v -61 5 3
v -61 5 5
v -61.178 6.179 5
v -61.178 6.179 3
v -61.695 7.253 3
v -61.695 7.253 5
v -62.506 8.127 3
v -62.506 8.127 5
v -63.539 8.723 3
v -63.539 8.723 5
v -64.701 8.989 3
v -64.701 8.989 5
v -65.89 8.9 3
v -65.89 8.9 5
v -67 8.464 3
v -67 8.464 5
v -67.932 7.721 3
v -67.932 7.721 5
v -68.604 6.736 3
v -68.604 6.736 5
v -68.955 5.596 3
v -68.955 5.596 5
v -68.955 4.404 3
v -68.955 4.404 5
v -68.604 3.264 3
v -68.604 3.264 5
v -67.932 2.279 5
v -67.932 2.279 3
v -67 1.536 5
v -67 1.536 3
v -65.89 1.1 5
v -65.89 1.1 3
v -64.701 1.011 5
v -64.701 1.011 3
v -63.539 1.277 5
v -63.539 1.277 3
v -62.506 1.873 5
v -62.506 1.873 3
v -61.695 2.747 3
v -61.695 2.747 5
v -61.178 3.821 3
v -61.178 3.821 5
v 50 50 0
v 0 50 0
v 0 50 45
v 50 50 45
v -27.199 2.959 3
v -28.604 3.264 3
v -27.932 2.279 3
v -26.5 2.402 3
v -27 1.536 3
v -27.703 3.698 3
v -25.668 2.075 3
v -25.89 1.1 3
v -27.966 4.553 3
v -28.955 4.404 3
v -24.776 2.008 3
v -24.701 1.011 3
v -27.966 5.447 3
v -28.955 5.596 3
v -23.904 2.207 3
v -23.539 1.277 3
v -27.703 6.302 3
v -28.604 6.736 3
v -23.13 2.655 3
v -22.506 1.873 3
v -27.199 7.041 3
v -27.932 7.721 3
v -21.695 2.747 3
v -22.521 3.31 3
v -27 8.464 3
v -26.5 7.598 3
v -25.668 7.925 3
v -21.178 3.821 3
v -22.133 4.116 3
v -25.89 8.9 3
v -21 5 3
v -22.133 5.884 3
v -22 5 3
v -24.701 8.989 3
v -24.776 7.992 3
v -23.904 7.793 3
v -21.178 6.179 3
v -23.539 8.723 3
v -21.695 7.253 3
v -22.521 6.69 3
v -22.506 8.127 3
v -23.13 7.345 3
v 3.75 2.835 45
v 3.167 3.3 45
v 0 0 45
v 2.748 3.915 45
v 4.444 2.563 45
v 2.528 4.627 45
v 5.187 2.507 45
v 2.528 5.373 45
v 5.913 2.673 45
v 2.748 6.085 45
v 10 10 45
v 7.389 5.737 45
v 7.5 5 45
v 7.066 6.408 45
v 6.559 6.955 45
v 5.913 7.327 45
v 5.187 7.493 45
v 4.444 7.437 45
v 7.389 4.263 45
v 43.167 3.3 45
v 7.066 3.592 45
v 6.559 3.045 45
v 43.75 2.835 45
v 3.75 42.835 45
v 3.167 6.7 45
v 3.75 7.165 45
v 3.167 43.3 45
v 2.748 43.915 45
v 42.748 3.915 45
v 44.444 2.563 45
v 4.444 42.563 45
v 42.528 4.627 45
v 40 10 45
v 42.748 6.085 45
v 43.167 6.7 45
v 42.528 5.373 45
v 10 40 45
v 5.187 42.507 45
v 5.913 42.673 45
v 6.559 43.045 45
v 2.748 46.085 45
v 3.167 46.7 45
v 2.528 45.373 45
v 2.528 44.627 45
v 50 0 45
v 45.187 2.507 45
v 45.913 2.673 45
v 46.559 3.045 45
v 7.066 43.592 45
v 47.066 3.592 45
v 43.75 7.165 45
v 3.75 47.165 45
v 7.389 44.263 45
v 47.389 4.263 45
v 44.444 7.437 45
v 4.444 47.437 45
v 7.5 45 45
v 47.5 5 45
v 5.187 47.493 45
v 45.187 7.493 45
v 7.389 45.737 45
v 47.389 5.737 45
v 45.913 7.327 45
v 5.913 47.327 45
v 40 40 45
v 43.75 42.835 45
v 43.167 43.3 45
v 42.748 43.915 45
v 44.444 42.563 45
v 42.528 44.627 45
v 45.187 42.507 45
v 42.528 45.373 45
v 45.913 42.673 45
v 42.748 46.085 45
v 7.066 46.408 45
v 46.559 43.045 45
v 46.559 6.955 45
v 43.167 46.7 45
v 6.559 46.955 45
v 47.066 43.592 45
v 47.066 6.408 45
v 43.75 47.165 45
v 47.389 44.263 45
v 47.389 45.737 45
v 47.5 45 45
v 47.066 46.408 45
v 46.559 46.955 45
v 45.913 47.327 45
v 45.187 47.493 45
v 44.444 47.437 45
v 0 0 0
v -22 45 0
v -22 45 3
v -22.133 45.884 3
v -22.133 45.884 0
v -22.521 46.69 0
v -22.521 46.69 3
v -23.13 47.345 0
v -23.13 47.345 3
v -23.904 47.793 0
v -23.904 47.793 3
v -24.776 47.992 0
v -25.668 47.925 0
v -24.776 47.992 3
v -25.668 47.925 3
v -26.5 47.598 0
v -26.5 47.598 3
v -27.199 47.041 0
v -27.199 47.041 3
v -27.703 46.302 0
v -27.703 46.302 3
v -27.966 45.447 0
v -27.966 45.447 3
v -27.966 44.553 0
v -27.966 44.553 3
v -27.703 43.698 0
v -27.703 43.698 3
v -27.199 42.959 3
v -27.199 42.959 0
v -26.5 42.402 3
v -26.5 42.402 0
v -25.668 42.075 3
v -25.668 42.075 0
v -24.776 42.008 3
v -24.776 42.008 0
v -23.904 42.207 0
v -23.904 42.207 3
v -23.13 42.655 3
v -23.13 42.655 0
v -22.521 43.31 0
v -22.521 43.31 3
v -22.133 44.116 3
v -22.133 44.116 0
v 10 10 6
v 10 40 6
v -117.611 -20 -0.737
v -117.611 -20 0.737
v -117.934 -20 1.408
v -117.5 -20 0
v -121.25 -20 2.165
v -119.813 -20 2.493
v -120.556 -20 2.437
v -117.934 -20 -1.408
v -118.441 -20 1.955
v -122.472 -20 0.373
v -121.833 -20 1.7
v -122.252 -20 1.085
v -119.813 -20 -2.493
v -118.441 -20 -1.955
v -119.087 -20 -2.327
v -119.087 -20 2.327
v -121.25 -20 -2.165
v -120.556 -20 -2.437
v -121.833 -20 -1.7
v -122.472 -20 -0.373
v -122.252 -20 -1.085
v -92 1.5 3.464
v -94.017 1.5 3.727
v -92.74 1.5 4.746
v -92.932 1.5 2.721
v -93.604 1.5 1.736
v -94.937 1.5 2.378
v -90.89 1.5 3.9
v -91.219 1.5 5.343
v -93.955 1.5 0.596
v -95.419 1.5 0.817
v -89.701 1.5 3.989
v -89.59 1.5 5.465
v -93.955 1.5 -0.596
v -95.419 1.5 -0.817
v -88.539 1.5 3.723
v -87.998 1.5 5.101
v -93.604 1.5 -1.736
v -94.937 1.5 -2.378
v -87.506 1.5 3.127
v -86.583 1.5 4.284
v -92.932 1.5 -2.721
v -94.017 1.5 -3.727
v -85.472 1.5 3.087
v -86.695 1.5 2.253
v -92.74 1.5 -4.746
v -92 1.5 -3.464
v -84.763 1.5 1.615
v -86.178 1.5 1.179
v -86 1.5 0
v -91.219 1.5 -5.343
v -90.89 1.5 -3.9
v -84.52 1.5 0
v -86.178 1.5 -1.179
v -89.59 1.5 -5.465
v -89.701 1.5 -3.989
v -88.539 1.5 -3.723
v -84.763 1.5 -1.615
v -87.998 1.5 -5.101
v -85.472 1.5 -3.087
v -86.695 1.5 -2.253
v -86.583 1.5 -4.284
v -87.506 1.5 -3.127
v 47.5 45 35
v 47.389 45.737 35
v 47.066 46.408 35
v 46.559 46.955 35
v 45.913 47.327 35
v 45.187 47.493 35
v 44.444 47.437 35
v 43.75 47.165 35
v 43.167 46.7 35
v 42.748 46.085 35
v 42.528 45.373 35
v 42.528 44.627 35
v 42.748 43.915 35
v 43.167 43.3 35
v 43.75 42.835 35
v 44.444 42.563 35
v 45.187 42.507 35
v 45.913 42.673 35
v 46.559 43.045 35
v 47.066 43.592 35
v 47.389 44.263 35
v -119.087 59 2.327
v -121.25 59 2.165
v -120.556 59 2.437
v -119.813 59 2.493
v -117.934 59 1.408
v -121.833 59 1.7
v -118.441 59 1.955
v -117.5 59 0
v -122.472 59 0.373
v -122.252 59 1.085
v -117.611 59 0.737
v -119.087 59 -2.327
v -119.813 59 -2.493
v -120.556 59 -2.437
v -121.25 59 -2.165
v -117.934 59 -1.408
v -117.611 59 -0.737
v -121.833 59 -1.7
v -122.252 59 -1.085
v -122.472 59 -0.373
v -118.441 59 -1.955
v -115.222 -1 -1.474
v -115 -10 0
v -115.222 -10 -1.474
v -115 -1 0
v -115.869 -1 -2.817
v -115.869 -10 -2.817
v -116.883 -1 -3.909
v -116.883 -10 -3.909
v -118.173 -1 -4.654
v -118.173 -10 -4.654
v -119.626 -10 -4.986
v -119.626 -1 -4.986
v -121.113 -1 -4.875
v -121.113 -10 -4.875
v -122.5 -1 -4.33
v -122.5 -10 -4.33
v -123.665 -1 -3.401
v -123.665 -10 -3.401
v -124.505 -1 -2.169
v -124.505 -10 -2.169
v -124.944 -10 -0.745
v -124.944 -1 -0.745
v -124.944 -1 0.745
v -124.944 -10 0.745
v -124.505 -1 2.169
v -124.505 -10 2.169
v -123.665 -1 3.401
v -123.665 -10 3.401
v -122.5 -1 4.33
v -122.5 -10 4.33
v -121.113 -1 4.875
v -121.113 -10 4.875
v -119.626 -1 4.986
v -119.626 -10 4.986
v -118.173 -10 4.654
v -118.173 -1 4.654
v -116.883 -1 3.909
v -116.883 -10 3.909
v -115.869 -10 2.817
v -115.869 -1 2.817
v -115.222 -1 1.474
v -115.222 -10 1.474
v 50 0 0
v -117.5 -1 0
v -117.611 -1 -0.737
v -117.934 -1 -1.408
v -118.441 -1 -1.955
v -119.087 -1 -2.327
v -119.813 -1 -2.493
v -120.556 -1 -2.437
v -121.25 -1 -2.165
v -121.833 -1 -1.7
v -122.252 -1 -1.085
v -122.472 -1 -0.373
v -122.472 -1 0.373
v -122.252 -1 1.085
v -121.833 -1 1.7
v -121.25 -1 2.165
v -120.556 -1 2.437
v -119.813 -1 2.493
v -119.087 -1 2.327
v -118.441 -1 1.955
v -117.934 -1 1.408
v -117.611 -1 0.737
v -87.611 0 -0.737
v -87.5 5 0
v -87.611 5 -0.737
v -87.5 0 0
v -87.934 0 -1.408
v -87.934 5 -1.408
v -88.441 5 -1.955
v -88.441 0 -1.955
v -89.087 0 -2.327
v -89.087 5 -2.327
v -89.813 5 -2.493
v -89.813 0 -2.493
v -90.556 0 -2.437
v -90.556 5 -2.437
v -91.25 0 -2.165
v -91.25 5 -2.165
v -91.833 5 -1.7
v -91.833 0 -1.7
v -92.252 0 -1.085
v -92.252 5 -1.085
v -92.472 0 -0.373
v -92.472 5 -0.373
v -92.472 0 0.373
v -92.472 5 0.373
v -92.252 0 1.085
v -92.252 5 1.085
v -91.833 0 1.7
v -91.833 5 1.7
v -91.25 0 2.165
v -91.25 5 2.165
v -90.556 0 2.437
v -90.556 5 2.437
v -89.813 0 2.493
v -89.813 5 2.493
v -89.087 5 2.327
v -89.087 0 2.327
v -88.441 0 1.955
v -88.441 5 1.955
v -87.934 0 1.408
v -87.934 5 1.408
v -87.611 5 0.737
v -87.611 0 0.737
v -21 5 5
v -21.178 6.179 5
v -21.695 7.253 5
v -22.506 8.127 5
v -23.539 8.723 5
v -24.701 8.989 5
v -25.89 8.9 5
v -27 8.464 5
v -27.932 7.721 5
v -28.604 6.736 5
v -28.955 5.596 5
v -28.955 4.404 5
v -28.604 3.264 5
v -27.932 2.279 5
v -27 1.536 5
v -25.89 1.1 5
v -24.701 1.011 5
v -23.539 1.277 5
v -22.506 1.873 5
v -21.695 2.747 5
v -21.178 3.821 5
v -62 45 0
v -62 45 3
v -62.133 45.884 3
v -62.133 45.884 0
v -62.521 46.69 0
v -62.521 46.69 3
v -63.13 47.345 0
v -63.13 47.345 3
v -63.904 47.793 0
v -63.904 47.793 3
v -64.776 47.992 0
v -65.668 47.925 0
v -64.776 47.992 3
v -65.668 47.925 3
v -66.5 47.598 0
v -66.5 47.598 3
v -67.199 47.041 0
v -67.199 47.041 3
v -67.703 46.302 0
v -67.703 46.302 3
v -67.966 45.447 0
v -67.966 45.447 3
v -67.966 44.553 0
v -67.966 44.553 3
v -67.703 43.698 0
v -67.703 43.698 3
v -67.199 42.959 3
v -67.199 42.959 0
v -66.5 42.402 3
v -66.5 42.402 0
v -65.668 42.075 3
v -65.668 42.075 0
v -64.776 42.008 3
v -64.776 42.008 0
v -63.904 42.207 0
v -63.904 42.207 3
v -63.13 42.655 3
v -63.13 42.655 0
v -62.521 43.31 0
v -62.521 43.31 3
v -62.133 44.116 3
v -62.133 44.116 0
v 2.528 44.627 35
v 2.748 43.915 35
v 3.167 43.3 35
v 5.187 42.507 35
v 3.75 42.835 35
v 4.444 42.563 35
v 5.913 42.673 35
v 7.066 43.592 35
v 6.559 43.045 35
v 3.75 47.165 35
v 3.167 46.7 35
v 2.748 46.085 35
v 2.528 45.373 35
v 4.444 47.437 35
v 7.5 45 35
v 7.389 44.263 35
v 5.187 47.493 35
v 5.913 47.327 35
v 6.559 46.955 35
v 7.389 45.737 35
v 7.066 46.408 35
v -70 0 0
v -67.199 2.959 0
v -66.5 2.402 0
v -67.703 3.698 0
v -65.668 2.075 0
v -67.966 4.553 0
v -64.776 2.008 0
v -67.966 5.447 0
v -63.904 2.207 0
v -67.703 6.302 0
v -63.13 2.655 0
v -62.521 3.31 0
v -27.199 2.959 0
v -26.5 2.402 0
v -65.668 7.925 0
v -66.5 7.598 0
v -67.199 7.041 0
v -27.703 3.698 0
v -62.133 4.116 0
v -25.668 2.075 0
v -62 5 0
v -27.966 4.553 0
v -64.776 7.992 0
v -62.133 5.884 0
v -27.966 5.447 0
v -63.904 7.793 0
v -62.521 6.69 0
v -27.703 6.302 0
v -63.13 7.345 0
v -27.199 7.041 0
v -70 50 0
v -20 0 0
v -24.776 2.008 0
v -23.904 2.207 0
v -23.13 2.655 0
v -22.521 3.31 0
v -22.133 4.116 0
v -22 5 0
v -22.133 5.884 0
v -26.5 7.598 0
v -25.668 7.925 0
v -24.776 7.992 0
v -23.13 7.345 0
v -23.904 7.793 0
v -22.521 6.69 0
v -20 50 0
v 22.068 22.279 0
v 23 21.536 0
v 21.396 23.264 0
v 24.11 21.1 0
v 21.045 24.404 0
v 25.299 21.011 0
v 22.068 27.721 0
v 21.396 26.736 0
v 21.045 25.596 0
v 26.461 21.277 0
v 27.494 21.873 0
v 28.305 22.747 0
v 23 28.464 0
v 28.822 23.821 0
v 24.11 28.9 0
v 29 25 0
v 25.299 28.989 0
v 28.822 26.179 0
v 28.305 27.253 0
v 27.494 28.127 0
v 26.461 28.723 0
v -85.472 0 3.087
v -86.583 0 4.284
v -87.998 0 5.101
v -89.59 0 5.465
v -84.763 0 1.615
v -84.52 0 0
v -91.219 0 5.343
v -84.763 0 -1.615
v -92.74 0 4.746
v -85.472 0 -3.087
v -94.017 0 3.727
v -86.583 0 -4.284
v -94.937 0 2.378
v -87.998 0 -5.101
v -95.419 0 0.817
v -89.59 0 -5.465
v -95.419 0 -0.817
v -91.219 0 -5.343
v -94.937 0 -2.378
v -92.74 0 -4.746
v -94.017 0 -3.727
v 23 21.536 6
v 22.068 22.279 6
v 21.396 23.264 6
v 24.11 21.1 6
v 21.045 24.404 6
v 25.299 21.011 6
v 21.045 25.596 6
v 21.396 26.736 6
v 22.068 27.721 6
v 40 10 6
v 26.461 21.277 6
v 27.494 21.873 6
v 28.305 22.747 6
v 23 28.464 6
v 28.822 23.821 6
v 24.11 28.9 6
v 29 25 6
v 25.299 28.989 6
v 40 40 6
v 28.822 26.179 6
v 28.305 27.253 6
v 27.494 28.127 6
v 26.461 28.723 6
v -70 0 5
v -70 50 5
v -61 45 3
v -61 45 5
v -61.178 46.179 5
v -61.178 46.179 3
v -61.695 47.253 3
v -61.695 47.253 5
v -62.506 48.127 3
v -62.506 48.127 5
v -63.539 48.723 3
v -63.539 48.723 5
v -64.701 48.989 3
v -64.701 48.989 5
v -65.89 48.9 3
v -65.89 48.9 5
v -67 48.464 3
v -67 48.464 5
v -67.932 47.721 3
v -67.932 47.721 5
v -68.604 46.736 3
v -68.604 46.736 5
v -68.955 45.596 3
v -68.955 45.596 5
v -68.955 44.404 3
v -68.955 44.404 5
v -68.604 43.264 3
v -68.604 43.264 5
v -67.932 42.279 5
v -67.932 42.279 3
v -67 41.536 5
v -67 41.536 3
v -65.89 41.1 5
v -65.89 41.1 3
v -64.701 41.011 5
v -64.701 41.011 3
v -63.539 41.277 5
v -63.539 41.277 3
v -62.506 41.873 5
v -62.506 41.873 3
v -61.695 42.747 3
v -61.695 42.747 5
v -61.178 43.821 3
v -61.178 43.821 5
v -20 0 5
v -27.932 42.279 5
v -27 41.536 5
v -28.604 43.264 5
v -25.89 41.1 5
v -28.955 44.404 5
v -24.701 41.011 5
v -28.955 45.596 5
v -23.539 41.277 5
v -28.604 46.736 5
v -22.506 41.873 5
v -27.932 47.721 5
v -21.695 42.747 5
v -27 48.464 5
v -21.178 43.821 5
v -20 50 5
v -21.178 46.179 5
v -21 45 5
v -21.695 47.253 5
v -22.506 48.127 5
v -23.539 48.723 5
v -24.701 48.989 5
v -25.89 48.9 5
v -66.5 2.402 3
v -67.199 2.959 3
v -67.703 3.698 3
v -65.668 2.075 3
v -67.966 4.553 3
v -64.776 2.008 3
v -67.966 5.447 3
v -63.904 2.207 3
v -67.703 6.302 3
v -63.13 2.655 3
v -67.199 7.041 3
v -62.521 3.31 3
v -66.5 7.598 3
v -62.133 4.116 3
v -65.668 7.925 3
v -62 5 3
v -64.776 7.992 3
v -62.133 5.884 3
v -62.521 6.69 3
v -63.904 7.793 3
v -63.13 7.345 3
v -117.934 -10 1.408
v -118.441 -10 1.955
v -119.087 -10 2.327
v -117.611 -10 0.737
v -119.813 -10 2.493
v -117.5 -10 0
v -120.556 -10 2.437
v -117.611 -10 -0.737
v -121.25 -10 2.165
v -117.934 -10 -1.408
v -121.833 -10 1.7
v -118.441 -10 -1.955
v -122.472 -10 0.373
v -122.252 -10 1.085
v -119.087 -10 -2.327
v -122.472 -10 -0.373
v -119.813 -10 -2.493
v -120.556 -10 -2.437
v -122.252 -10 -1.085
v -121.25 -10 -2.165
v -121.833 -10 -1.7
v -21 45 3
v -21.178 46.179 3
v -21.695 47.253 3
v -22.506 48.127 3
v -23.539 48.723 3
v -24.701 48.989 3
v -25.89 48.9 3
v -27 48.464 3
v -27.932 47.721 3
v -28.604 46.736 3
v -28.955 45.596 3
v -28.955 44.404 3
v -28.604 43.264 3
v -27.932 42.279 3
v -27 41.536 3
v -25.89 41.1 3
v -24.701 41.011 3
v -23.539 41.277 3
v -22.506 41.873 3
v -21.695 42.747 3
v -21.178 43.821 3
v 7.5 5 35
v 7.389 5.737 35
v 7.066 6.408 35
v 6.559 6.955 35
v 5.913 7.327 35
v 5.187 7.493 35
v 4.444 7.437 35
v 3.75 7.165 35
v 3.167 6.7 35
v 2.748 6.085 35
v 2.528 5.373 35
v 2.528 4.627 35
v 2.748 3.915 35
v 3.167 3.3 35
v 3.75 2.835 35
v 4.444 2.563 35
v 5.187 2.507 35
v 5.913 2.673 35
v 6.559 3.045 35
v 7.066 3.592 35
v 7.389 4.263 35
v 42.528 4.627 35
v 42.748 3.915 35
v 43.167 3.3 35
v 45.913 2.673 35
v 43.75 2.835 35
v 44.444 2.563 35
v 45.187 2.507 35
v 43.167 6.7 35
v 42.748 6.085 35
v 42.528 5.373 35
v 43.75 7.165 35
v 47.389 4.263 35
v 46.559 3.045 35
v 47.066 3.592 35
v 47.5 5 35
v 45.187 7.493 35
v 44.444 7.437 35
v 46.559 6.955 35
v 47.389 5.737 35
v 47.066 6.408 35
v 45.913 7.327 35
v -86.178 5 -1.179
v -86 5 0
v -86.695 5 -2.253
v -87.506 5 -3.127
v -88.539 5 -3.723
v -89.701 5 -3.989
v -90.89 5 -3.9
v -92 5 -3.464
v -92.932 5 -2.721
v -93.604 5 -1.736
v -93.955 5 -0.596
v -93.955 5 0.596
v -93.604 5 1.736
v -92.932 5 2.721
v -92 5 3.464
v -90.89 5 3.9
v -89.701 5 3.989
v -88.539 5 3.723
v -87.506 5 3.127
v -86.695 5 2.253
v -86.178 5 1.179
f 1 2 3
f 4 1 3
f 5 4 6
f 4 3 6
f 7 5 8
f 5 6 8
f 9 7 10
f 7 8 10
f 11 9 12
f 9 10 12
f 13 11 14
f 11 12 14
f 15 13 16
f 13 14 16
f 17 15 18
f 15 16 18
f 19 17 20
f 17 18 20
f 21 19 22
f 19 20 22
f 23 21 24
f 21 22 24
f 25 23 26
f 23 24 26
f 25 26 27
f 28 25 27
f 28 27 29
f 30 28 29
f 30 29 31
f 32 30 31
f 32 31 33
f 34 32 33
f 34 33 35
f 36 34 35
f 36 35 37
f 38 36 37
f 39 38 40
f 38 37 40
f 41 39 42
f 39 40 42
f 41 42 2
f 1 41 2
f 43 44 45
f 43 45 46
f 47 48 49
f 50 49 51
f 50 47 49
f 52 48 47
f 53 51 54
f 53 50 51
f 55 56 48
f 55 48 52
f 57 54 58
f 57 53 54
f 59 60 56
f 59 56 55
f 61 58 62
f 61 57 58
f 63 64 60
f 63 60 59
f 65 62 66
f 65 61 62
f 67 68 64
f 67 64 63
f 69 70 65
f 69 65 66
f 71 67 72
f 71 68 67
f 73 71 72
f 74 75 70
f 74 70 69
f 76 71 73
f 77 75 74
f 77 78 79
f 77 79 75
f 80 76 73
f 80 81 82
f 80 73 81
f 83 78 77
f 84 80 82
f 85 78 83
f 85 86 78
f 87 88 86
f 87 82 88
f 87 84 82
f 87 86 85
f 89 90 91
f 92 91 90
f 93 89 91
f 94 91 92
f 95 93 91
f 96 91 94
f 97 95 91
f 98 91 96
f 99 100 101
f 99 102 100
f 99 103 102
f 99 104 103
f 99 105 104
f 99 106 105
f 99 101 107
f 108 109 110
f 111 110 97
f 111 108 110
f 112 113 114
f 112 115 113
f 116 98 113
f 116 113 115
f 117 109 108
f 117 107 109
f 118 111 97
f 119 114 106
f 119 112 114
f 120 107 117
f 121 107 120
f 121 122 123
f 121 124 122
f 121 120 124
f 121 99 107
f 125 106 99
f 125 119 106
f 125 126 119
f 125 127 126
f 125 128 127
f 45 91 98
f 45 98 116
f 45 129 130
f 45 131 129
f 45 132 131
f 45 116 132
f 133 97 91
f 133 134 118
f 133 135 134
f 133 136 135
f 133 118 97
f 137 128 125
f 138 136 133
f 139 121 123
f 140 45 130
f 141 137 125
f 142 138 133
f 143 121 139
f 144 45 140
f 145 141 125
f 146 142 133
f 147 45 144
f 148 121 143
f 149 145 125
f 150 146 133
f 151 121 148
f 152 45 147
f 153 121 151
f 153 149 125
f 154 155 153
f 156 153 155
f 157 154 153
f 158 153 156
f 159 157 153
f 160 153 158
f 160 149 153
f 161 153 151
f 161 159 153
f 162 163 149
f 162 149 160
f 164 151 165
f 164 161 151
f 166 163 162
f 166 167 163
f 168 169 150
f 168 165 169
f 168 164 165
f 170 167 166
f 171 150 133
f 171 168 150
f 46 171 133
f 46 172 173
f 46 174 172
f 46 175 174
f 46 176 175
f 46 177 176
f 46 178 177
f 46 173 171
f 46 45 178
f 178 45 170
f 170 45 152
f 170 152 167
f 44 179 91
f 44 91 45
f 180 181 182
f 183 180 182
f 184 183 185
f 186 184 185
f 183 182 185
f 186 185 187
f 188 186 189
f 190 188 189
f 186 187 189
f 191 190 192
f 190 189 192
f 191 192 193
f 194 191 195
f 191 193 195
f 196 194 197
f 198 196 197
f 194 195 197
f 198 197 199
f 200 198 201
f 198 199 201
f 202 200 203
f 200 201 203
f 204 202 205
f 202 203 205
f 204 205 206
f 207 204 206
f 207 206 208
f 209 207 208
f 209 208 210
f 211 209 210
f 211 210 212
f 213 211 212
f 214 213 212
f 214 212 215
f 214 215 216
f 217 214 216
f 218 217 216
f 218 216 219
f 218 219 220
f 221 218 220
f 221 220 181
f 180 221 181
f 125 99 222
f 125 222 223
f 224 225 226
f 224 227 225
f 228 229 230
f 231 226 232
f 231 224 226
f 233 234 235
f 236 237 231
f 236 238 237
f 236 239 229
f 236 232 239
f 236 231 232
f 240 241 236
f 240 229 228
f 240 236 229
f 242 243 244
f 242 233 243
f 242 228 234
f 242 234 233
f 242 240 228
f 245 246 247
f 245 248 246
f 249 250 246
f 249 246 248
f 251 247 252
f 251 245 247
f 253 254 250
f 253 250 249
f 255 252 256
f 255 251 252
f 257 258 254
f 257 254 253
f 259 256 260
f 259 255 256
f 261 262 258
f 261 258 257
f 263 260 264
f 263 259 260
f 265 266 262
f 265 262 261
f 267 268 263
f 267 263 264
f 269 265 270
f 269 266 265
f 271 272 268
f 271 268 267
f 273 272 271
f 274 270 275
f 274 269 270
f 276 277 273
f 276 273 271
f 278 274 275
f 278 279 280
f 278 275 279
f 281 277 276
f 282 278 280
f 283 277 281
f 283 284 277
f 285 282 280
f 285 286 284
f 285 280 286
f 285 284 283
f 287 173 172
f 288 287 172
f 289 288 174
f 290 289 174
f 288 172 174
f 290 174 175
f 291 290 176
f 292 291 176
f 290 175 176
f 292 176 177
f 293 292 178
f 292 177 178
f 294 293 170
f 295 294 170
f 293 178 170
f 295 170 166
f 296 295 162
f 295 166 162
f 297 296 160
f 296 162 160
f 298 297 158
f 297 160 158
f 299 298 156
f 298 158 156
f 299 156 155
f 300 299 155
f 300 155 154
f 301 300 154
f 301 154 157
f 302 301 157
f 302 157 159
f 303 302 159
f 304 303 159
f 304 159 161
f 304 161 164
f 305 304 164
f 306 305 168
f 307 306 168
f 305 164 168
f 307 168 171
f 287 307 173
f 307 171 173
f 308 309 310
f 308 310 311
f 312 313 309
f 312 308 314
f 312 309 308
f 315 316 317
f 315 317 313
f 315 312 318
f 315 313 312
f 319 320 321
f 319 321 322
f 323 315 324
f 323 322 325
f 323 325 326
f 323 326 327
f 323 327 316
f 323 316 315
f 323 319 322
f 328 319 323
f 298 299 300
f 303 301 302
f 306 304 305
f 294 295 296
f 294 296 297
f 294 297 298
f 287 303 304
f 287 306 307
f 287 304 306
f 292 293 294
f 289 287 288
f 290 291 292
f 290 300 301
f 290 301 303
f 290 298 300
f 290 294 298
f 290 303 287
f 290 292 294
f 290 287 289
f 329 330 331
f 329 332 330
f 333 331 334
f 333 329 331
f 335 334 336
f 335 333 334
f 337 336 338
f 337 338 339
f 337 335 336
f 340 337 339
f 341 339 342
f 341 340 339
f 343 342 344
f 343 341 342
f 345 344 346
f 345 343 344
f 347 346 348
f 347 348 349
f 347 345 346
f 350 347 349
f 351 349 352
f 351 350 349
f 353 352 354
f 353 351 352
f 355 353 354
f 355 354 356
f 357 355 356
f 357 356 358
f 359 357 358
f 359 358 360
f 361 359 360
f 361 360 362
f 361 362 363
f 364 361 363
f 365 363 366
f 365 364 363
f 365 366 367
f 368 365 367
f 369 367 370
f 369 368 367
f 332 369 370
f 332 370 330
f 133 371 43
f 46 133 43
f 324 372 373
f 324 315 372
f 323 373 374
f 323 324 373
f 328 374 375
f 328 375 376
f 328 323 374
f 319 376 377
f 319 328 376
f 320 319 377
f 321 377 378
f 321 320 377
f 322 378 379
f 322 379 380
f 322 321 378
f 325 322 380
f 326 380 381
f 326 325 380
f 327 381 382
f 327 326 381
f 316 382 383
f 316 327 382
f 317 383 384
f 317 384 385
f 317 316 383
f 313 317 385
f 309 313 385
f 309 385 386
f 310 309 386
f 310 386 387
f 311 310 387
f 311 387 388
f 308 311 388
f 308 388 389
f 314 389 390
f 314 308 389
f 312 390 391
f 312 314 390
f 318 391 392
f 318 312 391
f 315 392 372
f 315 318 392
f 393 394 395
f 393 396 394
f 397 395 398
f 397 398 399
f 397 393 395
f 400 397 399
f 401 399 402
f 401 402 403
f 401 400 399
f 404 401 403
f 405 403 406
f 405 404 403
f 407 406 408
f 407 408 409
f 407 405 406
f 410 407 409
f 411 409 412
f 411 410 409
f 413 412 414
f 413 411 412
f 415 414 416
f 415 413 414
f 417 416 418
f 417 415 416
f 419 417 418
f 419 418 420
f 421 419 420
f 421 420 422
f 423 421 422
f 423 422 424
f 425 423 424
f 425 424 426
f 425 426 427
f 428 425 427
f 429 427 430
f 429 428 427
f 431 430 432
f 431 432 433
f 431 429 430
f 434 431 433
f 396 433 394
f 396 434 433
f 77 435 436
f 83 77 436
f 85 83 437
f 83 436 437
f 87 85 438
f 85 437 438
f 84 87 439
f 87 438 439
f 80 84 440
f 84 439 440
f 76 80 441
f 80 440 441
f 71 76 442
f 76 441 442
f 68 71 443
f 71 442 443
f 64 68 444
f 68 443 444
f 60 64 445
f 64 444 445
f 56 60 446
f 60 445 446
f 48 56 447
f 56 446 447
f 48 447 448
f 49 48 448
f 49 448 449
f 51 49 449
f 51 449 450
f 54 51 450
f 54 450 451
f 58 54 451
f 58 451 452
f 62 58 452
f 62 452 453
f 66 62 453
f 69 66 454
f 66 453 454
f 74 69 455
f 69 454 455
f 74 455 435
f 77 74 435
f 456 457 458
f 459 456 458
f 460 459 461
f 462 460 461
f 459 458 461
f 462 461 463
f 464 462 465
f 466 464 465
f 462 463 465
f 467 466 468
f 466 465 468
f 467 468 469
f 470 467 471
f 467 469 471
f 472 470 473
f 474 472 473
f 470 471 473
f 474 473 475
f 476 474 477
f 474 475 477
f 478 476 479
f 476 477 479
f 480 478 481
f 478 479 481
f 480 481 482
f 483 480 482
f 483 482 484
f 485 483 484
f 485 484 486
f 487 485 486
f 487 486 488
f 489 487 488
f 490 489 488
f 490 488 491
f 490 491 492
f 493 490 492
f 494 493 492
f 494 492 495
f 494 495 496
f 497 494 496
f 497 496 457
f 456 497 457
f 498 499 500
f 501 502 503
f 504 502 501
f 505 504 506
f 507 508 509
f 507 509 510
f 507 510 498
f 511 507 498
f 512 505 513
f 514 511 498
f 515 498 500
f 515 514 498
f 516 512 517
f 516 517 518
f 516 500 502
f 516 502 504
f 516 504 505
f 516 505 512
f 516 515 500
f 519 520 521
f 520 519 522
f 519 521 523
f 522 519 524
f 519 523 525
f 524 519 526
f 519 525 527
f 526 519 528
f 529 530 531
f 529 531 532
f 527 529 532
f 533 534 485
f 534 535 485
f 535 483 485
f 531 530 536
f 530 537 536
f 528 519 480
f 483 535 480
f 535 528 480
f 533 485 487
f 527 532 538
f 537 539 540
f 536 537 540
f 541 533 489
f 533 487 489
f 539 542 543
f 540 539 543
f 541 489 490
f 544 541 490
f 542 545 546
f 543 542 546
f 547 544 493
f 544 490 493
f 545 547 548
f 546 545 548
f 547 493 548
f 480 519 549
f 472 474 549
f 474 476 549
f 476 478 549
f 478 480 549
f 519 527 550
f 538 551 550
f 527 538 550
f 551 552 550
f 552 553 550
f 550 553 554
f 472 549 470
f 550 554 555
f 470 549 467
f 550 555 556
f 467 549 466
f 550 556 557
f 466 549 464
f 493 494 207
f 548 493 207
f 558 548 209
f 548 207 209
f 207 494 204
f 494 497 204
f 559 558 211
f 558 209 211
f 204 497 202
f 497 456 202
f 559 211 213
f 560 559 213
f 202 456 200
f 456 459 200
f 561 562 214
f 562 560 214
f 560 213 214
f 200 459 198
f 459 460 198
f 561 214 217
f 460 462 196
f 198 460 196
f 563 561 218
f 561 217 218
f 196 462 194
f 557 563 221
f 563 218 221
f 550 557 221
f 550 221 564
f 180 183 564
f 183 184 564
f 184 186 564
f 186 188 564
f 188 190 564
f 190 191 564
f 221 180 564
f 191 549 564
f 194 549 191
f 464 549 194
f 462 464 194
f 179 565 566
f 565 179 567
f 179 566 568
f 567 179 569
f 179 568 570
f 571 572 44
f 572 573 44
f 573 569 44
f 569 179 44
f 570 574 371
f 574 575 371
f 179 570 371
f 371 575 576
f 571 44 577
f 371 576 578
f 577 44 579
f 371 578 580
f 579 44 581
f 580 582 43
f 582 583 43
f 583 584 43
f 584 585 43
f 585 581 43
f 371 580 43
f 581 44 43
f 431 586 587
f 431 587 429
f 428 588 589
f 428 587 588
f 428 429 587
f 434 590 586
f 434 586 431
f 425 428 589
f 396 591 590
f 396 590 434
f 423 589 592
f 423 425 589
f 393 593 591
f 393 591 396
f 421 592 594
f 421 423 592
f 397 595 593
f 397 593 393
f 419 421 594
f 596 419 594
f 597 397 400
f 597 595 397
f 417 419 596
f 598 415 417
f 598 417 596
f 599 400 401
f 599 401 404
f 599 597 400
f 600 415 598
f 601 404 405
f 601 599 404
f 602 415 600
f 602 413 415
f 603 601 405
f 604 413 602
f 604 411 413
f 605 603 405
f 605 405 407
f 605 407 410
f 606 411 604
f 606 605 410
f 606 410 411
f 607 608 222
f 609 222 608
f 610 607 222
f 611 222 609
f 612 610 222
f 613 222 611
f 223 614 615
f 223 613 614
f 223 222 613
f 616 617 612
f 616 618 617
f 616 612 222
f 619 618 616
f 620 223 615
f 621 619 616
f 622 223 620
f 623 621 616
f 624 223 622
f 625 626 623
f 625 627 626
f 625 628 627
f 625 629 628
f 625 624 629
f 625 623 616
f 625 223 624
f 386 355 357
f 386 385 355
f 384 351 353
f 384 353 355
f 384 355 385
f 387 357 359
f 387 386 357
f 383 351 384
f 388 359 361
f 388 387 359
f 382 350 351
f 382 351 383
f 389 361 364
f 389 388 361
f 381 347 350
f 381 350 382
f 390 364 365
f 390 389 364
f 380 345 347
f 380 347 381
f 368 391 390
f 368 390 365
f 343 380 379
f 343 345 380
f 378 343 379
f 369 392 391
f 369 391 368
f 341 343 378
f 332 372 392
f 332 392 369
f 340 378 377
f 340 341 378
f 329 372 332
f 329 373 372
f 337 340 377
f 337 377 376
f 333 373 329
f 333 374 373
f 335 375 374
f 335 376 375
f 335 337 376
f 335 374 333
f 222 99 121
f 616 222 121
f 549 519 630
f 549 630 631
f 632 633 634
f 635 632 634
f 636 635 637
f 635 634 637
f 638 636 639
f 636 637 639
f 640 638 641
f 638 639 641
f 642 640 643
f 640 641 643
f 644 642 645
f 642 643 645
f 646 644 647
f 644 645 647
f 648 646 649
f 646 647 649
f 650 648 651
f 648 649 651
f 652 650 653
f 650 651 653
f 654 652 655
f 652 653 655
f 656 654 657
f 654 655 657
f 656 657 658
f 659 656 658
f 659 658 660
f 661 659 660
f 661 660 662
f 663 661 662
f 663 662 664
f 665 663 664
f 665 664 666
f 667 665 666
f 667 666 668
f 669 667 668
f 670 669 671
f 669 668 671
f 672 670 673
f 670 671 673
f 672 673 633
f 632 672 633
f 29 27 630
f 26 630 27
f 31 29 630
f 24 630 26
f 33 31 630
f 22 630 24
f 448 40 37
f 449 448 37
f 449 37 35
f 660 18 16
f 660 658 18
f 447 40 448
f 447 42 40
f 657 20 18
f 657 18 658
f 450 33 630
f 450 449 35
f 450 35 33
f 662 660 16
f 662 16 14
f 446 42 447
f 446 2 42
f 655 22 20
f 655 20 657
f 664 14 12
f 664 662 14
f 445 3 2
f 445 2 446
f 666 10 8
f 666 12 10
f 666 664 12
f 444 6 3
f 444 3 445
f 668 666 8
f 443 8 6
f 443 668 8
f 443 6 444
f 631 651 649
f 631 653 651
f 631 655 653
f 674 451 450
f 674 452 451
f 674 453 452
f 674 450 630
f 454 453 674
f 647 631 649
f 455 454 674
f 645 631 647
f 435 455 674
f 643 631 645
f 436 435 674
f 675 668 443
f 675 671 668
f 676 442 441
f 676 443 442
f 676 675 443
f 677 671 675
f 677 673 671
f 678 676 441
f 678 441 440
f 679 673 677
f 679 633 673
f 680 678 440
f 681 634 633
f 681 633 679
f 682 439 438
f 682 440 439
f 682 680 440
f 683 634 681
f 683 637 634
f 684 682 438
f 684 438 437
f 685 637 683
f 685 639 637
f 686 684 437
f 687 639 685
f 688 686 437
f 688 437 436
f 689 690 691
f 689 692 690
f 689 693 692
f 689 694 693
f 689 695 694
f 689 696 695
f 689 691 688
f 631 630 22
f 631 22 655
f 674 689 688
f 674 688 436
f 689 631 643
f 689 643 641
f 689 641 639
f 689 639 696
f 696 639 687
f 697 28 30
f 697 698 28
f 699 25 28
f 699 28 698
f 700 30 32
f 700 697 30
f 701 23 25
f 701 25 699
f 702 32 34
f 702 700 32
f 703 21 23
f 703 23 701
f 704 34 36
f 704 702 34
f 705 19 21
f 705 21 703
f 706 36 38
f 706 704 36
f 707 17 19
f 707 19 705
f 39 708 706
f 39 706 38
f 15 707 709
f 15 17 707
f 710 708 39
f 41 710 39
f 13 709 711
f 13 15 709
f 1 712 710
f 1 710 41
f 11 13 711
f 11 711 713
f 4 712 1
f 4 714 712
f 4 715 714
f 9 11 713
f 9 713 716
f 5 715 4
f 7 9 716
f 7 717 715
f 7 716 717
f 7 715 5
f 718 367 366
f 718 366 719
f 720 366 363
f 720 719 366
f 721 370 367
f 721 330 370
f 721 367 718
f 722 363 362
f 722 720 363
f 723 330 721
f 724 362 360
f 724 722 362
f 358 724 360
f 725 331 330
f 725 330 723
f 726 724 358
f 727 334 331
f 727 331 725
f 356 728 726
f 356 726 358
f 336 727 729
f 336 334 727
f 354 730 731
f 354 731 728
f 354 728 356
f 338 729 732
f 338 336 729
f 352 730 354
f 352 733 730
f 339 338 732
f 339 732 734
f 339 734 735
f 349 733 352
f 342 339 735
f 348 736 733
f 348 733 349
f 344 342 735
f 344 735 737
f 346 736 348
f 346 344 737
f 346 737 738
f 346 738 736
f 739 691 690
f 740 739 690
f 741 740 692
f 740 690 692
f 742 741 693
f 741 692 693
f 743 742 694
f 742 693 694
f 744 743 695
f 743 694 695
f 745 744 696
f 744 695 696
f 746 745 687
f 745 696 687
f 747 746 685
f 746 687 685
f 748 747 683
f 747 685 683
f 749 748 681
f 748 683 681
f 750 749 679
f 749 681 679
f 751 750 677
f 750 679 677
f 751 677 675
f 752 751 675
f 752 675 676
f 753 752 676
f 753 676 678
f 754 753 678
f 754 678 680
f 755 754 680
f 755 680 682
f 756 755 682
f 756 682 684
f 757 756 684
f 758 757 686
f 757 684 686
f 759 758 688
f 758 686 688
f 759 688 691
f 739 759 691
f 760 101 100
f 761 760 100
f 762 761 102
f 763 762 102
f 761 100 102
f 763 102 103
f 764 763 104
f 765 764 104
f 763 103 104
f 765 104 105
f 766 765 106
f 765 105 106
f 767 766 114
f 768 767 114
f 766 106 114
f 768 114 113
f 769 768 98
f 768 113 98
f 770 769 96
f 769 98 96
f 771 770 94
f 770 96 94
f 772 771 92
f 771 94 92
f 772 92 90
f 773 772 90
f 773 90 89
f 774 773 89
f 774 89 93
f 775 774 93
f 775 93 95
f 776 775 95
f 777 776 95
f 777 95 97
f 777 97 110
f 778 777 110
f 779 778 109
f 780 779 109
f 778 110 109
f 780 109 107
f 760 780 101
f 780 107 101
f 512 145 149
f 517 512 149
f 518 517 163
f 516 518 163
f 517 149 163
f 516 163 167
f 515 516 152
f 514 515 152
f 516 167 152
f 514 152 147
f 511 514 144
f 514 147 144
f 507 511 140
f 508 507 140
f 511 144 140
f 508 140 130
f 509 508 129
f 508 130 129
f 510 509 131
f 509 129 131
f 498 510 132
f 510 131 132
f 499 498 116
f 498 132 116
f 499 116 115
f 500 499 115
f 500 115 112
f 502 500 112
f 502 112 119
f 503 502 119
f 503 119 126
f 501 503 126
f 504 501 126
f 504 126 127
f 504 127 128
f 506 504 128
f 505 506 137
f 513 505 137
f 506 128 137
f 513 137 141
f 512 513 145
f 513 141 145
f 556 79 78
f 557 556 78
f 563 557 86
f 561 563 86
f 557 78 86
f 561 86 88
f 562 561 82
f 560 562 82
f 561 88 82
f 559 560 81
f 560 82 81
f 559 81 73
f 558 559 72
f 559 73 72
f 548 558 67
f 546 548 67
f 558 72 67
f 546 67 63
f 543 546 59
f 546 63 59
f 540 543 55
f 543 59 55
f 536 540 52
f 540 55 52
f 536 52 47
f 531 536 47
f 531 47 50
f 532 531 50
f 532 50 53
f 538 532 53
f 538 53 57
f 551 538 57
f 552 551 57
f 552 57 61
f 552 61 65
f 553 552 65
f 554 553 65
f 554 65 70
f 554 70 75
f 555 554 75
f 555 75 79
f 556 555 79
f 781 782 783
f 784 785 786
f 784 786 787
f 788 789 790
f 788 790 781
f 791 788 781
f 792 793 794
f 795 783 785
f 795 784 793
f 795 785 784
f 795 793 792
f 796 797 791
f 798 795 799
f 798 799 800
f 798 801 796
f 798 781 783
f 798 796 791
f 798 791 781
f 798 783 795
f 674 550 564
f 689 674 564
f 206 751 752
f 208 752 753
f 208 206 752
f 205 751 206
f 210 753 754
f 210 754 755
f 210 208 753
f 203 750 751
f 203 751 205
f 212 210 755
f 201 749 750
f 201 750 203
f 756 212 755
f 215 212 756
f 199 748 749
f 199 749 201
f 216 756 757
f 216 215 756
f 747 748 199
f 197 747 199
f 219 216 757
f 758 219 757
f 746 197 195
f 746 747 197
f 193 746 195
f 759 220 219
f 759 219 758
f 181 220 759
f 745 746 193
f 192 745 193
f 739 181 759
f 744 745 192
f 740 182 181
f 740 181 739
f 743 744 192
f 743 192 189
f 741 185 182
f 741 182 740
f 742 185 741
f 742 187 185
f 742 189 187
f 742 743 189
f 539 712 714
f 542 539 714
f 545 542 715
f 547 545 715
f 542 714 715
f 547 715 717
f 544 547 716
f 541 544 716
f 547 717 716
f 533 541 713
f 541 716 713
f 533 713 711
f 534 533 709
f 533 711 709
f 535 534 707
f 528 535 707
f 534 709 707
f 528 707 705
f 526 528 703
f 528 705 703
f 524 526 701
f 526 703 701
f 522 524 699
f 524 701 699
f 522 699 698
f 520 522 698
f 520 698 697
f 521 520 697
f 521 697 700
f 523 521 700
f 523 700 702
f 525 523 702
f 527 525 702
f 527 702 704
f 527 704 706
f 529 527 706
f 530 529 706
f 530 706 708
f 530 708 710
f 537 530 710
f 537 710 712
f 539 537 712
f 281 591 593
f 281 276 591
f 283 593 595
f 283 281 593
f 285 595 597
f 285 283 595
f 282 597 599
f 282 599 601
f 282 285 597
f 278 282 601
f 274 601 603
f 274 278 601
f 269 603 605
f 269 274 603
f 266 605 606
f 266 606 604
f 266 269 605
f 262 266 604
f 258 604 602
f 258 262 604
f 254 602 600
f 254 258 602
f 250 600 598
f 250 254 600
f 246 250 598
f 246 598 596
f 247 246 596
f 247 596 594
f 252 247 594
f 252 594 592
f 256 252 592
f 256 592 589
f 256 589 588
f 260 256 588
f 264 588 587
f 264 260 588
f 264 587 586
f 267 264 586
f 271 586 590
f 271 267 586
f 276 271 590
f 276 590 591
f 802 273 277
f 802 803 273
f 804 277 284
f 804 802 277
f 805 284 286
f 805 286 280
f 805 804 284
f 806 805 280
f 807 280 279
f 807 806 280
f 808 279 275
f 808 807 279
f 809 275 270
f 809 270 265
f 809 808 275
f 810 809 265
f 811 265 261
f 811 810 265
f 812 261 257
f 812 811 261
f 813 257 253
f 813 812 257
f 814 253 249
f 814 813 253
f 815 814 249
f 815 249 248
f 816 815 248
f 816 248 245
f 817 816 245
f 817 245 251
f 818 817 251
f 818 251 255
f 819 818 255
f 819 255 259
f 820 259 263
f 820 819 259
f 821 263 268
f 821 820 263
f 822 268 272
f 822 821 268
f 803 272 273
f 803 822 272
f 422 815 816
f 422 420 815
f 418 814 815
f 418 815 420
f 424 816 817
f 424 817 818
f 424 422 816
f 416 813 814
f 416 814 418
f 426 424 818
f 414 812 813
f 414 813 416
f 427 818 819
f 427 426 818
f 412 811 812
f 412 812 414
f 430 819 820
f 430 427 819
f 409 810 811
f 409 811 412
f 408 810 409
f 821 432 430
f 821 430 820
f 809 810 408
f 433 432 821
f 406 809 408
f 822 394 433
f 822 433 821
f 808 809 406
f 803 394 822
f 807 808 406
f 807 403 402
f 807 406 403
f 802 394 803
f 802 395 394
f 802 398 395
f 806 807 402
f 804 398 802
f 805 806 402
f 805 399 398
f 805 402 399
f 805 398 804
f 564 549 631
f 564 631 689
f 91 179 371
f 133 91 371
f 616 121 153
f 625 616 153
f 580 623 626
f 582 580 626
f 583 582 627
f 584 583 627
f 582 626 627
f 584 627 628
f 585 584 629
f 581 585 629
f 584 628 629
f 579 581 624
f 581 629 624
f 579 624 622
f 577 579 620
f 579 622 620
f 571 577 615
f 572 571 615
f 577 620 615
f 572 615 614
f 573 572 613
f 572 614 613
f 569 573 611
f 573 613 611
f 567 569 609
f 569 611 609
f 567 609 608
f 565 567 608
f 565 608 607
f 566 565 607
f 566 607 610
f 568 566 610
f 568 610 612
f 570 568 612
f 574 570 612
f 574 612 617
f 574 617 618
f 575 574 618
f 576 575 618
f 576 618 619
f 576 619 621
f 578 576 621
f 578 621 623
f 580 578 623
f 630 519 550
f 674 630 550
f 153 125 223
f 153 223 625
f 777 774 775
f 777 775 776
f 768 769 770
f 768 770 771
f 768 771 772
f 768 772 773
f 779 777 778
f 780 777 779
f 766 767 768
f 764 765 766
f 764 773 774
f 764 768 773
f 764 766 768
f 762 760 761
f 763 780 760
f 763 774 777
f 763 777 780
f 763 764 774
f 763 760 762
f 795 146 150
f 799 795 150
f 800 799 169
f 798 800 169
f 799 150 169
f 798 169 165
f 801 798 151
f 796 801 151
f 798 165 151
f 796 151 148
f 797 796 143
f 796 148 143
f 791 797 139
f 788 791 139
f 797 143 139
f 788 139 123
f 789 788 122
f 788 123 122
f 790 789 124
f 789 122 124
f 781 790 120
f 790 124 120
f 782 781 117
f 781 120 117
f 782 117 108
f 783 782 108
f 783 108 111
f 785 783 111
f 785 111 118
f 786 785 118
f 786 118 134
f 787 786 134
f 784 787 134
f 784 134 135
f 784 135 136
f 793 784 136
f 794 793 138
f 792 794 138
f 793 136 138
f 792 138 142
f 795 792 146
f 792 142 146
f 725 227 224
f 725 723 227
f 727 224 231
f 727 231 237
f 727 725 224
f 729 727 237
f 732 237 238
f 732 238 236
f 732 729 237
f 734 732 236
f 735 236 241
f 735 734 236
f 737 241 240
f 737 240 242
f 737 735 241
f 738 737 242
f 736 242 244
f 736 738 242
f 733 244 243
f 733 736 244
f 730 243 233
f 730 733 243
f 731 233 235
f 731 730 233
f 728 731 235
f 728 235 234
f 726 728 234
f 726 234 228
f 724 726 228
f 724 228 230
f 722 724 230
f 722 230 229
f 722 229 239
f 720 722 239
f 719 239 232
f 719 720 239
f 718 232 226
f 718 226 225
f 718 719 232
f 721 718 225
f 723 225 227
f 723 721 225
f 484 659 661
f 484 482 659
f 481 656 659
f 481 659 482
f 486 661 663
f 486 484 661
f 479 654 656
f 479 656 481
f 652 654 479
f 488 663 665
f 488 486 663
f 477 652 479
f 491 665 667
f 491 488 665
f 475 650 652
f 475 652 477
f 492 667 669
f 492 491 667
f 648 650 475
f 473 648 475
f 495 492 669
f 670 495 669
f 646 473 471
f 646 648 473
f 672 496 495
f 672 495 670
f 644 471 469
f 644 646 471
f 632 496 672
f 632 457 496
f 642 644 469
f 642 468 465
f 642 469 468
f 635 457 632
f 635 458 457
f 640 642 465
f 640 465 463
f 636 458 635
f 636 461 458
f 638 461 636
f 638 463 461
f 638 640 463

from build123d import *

# Parameters (mm, degrees)
F0_W      = 50
F0_H      = 50
F1_DEPTH  = 45
F2_W      = 30
F2_H      = 30
F3_DEPTH  = 39
F4_R      = 2.5
F5_DEPTH  = 10
F6_R      = 4
F7_DEPTH  = 25
F8_W      = 50
F8_H      = 50
F9_DEPTH  = 5
F10_R     = 3
F11_DEPTH = 25
F12_R     = 4
F13_DEPTH = 2


with BuildPart() as f1:
    # F0 (on Top) → F1 (new body)
    with BuildSketch(Plane.XY):
        with Locations((25, 25)):
            Rectangle(F0_W, F0_H)
    extrude(amount=F1_DEPTH)

    # F2 (on face) → F3 (cut)
    with BuildSketch(Plane.XY.offset(45)):
        with Locations((25, 25)):
            Rectangle(F2_W, F2_H)
    extrude(amount=-F3_DEPTH, mode=Mode.SUBTRACT)

    # F4 (on face) → F5 (cut)
    with BuildSketch(Plane.XY.offset(45)):
        with Locations((5, 45)):
            Circle(F4_R)
        with Locations((5, 5)):
            Circle(F4_R)
        with Locations((45, 45)):
            Circle(F4_R)
        with Locations((45, 5)):
            Circle(F4_R)
    extrude(amount=-F5_DEPTH, mode=Mode.SUBTRACT)

    # F6 (on face) → F7 (cut)
    with BuildSketch(Plane.XY.offset(6)):
        with Locations((25, 25)):
            Circle(F6_R)
    extrude(amount=-F7_DEPTH, mode=Mode.SUBTRACT)


with BuildPart() as f9:
    # F8 (on Top) → F9 (new body)
    with BuildSketch(Plane.XY):
        with Locations((-45, 25)):
            Rectangle(F8_W, F8_H)
    extrude(amount=F9_DEPTH)

    # F10 (on face) → F11 (cut)
    with BuildSketch(Plane.XY.offset(5)):
        with Locations((-65, 45)):
            Circle(F10_R)
        with Locations((-25, 45)):
            Circle(F10_R)
        with Locations((-25, 5)):
            Circle(F10_R)
        with Locations((-65, 5)):
            Circle(F10_R)
    extrude(amount=-F11_DEPTH, mode=Mode.SUBTRACT)

    # F12 (on face) → F13 (cut)
    with BuildSketch(Plane.XY.offset(5)):
        with Locations((-65, 45)):
            Circle(F12_R)
        with Locations((-65, 5)):
            Circle(F12_R)
        with Locations((-25, 5)):
            Circle(F12_R)
        with Locations((-25, 45)):
            Circle(F12_R)
    extrude(amount=-F13_DEPTH, mode=Mode.SUBTRACT)


with BuildPart() as f15:
    # F14 (on Top) → F15 (revolve)
    with BuildSketch(Plane.XY):
        Polygon((-87.5, 5), (-87.5, 0), (-84.52, 0), (-84.52, 1.5), (-86, 1.5), (-86, 5), align=None)
    revolve(axis=Axis((-90, 5, 0), (0, 1, 0)))


with BuildPart() as f17:
    # F16 (on Top) → F17 (revolve)
    with BuildSketch(Plane.XY):
        Polygon((-120, 59), (-120, -20), (-117.5, -20), (-117.5, -10), (-115, -10), (-115, -1), (-117.5, -1), (-117.5, 59), align=None)
    revolve(axis=Axis((-120, 24.713512, 0), (0, 1, 0)))


solid = Compound([f1.part, f9.part, f15.part, f17.part])
